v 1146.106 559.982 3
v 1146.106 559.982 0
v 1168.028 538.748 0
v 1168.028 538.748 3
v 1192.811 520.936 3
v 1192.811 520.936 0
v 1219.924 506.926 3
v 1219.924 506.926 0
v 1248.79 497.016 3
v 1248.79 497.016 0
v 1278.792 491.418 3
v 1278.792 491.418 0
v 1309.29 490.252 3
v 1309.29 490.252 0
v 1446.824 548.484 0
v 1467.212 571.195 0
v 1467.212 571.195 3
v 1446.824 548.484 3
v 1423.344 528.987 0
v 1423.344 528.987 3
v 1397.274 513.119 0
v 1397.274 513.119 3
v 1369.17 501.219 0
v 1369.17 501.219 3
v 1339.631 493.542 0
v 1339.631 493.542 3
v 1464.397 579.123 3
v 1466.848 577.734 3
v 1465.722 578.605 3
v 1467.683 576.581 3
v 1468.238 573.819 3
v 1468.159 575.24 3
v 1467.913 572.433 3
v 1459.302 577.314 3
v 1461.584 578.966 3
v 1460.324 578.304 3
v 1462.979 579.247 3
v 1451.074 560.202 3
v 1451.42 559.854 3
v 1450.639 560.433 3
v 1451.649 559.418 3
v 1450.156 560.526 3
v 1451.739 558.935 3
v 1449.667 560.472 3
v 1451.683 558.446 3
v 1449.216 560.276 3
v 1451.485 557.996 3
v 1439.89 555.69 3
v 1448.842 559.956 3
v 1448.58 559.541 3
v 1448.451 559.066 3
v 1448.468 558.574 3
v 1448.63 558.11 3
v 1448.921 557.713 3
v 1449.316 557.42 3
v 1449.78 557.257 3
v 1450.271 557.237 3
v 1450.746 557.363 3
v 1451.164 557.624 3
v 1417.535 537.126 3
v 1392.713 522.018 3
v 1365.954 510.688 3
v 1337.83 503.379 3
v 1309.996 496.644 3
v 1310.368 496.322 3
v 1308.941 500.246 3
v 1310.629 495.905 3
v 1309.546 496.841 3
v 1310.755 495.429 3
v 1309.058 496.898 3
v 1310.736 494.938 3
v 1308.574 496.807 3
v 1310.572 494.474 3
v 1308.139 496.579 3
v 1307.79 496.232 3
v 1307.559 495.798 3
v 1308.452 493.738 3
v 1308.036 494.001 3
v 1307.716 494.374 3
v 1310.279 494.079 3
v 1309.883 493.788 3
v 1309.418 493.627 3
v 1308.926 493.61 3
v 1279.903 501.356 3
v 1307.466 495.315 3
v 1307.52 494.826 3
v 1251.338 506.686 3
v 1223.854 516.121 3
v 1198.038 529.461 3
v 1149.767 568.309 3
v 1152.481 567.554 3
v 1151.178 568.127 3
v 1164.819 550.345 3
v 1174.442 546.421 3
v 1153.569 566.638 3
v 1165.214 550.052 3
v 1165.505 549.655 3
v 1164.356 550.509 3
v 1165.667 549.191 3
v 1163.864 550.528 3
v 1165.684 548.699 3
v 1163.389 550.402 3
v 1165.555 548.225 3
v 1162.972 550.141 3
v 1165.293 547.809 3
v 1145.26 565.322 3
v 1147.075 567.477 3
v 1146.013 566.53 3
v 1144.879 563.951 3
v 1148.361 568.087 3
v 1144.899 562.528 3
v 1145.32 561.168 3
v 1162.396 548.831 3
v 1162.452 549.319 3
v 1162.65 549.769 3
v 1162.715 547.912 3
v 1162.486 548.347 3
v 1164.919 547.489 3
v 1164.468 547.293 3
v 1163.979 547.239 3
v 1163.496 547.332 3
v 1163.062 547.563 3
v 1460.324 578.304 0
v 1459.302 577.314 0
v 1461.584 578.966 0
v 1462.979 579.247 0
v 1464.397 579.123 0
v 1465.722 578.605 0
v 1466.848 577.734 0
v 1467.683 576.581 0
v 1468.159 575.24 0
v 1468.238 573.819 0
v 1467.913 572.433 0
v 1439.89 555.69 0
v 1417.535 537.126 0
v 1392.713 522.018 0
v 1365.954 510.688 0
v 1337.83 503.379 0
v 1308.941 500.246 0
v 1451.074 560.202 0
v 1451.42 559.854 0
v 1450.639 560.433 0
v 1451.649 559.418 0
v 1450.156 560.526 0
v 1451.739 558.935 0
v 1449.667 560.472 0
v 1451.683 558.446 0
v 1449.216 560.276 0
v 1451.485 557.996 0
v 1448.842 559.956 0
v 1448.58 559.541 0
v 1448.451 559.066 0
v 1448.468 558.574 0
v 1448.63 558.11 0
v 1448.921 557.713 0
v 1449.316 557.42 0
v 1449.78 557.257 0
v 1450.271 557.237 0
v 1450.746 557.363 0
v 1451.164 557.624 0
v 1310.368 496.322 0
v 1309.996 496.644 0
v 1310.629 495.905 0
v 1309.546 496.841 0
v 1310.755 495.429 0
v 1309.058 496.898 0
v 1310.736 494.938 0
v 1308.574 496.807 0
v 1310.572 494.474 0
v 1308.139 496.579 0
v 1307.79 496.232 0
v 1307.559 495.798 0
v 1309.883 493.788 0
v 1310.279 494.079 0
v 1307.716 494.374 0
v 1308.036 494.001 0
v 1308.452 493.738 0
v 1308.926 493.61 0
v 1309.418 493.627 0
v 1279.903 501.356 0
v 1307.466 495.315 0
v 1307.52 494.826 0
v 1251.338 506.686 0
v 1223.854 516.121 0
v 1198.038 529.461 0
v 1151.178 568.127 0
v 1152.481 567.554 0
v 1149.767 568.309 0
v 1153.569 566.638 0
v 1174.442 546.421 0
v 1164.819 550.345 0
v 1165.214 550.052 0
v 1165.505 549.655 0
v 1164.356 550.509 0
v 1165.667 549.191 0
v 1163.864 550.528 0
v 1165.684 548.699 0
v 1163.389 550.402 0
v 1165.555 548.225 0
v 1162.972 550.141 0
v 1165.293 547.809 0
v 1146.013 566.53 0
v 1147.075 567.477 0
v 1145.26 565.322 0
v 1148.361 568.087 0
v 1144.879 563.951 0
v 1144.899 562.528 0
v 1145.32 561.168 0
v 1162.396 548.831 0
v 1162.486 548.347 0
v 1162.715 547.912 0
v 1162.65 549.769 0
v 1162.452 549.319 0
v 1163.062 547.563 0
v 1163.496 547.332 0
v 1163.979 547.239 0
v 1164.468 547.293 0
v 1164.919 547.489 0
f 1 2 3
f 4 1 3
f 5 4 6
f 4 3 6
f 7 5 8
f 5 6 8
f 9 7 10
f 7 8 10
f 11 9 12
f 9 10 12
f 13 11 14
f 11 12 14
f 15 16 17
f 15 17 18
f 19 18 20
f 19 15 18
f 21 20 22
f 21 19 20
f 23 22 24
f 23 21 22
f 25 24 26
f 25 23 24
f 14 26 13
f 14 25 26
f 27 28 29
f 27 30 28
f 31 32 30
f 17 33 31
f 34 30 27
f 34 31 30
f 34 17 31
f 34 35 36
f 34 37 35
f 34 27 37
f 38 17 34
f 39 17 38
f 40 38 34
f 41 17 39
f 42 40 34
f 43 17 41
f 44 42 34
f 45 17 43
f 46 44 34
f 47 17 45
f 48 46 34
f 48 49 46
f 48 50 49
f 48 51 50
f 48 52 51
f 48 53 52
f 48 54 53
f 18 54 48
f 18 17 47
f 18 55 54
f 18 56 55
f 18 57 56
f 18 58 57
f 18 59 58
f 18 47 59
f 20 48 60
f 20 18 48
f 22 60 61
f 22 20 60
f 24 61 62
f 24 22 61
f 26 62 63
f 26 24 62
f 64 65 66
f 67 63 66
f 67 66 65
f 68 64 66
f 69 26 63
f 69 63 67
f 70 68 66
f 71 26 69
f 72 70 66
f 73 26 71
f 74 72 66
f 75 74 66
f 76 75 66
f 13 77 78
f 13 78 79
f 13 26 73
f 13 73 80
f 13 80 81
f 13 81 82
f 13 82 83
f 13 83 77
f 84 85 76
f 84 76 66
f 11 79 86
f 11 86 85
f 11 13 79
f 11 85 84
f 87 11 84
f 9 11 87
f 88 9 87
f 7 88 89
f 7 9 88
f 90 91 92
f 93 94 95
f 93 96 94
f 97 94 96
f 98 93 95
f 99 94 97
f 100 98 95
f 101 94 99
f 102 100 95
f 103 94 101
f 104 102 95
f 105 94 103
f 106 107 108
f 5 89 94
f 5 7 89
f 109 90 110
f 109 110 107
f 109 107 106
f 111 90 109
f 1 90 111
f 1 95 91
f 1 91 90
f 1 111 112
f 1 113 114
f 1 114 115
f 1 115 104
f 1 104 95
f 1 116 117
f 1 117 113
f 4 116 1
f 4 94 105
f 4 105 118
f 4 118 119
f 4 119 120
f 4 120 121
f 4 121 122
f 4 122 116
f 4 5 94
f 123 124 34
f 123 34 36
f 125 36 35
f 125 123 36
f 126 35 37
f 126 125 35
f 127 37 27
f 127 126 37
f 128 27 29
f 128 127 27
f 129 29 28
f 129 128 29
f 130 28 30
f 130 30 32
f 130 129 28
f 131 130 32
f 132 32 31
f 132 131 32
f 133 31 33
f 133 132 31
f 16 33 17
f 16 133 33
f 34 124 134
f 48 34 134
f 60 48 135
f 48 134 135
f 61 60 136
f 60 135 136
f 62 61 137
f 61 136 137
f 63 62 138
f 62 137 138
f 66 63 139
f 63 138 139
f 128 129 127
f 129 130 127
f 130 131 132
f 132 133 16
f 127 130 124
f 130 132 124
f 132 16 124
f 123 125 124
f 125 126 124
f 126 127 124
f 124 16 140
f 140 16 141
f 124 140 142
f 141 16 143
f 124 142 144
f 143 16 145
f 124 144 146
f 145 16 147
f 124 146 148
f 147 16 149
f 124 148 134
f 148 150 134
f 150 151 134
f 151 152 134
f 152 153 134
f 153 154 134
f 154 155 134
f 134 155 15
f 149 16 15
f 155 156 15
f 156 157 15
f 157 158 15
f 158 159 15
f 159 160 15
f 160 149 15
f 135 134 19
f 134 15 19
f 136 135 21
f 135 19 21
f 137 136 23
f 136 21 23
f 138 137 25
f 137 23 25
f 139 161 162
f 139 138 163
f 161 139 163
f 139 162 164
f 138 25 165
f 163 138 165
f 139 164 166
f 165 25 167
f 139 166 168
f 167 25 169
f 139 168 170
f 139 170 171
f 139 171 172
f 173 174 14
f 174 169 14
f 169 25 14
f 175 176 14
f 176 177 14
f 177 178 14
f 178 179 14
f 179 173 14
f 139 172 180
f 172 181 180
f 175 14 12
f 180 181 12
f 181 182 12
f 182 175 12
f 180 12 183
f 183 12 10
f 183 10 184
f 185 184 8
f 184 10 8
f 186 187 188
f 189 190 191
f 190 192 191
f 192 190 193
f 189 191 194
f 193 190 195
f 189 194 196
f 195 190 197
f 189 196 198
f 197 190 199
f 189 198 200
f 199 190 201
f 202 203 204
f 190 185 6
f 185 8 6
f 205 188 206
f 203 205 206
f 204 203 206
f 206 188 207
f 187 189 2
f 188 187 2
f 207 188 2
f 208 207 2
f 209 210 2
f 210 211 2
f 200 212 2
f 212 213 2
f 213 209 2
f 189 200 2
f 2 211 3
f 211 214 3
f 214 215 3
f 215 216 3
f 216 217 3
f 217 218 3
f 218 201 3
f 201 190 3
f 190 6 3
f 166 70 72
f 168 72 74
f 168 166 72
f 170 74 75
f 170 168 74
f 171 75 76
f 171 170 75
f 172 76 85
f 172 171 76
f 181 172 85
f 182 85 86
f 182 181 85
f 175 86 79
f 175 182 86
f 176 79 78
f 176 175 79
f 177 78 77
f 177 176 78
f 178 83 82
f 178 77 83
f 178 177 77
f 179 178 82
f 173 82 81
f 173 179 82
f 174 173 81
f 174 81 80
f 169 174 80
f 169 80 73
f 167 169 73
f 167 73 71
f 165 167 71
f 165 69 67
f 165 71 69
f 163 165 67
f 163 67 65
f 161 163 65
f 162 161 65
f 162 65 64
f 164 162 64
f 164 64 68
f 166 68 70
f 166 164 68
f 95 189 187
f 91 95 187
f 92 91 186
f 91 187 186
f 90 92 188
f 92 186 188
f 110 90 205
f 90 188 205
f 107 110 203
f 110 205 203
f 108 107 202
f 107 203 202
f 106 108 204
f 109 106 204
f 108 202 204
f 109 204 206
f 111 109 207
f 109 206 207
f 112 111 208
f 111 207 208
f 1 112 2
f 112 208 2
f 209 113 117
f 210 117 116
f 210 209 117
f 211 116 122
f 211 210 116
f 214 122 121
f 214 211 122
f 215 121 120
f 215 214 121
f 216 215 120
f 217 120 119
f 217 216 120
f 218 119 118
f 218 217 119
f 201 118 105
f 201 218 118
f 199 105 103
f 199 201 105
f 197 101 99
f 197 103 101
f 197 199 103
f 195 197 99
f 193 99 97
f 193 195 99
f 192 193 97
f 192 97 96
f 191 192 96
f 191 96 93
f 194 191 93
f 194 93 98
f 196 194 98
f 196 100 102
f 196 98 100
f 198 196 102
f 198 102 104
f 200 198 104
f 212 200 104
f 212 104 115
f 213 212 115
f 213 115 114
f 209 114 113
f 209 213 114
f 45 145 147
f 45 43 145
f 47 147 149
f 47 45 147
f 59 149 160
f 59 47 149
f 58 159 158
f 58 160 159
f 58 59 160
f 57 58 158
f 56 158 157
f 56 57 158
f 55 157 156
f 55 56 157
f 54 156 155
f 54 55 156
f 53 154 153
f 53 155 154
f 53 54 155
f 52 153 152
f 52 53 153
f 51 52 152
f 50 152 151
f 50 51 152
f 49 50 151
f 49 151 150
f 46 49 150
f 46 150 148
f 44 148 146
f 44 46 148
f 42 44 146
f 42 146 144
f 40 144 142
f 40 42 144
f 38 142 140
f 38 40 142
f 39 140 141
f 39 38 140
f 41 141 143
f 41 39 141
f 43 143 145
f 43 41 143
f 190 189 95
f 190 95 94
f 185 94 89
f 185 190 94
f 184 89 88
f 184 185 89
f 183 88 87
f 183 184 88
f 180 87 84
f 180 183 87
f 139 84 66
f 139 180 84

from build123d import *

# Parameters (mm, degrees)
PAD014_DEPTH                        = 3
SKETCH055_R                         = 1.65
POCKET019_DEPTH                     = 364.282338
POCKET019_DEPTH_BACK                = 367.282338
BODY001003005003003_PLACEMENT_ANGLE = 60
CLONE003_PLACEMENT_ANGLE            = 122


with BuildPart() as part:
    # Sketch052 → Pad014 (new body)
    with BuildSketch(Plane.XY):
        with BuildLine():
            ThreePointArc((152.959511, 127.101705), (84.480895, 180.040089), (0, 198.875477))
            Line((0, 198.875477), (0, 208.875477))
            ThreePointArc((160.650731, 133.492724), (88.728824, 189.092995), (0, 208.875477))
            ThreePointArc((152.959511, 127.101705), (160.000631, 126.451604), (160.650731, 133.492724))
        make_face()
    pad014 = extrude(amount=PAD014_DEPTH)

    # Sketch055 → Pocket019 (cut, two sides)
    with BuildSketch(Plane.XY) as pocket019_sk:
        with Locations((143.11, 145.205847)):
            Circle(SKETCH055_R)
        with BuildLine():
            Line((0, 202.225477), (0, 205.525477))
            ThreePointArc((0, 202.225477), (1.65, 203.875477), (0, 205.525477))
        make_face()
    pocket019 = extrude(amount=-POCKET019_DEPTH, mode=Mode.SUBTRACT) + extrude(pocket019_sk.sketch, amount=POCKET019_DEPTH_BACK, mode=Mode.SUBTRACT)

    # Mirrored019: Pad014, Pocket019 across Sketch052 V_Axis
    add(pad014.mirror(Plane(origin=(0, 0, 0), x_dir=(0, 0, 1), z_dir=(1, 0, 0))))
    add(pocket019.mirror(Plane(origin=(0, 0, 0), x_dir=(0, 0, 1), z_dir=(1, 0, 0))), mode=Mode.SUBTRACT)


with BuildPart() as part_1:
    # Body001003005003003 placement: moved
    add(part.part.rotate(Axis((0, 0, 0), (0, 0, 1)), BODY001003005003003_PLACEMENT_ANGLE))


with BuildPart() as part_2:
    # Clone003 placement: moved
    add(part_1.part.moved(Location((1302, 699, 0))).rotate(Axis((1302, 699, 0), (0, 0, 1)), CLONE003_PLACEMENT_ANGLE))


solid = part_2.part
